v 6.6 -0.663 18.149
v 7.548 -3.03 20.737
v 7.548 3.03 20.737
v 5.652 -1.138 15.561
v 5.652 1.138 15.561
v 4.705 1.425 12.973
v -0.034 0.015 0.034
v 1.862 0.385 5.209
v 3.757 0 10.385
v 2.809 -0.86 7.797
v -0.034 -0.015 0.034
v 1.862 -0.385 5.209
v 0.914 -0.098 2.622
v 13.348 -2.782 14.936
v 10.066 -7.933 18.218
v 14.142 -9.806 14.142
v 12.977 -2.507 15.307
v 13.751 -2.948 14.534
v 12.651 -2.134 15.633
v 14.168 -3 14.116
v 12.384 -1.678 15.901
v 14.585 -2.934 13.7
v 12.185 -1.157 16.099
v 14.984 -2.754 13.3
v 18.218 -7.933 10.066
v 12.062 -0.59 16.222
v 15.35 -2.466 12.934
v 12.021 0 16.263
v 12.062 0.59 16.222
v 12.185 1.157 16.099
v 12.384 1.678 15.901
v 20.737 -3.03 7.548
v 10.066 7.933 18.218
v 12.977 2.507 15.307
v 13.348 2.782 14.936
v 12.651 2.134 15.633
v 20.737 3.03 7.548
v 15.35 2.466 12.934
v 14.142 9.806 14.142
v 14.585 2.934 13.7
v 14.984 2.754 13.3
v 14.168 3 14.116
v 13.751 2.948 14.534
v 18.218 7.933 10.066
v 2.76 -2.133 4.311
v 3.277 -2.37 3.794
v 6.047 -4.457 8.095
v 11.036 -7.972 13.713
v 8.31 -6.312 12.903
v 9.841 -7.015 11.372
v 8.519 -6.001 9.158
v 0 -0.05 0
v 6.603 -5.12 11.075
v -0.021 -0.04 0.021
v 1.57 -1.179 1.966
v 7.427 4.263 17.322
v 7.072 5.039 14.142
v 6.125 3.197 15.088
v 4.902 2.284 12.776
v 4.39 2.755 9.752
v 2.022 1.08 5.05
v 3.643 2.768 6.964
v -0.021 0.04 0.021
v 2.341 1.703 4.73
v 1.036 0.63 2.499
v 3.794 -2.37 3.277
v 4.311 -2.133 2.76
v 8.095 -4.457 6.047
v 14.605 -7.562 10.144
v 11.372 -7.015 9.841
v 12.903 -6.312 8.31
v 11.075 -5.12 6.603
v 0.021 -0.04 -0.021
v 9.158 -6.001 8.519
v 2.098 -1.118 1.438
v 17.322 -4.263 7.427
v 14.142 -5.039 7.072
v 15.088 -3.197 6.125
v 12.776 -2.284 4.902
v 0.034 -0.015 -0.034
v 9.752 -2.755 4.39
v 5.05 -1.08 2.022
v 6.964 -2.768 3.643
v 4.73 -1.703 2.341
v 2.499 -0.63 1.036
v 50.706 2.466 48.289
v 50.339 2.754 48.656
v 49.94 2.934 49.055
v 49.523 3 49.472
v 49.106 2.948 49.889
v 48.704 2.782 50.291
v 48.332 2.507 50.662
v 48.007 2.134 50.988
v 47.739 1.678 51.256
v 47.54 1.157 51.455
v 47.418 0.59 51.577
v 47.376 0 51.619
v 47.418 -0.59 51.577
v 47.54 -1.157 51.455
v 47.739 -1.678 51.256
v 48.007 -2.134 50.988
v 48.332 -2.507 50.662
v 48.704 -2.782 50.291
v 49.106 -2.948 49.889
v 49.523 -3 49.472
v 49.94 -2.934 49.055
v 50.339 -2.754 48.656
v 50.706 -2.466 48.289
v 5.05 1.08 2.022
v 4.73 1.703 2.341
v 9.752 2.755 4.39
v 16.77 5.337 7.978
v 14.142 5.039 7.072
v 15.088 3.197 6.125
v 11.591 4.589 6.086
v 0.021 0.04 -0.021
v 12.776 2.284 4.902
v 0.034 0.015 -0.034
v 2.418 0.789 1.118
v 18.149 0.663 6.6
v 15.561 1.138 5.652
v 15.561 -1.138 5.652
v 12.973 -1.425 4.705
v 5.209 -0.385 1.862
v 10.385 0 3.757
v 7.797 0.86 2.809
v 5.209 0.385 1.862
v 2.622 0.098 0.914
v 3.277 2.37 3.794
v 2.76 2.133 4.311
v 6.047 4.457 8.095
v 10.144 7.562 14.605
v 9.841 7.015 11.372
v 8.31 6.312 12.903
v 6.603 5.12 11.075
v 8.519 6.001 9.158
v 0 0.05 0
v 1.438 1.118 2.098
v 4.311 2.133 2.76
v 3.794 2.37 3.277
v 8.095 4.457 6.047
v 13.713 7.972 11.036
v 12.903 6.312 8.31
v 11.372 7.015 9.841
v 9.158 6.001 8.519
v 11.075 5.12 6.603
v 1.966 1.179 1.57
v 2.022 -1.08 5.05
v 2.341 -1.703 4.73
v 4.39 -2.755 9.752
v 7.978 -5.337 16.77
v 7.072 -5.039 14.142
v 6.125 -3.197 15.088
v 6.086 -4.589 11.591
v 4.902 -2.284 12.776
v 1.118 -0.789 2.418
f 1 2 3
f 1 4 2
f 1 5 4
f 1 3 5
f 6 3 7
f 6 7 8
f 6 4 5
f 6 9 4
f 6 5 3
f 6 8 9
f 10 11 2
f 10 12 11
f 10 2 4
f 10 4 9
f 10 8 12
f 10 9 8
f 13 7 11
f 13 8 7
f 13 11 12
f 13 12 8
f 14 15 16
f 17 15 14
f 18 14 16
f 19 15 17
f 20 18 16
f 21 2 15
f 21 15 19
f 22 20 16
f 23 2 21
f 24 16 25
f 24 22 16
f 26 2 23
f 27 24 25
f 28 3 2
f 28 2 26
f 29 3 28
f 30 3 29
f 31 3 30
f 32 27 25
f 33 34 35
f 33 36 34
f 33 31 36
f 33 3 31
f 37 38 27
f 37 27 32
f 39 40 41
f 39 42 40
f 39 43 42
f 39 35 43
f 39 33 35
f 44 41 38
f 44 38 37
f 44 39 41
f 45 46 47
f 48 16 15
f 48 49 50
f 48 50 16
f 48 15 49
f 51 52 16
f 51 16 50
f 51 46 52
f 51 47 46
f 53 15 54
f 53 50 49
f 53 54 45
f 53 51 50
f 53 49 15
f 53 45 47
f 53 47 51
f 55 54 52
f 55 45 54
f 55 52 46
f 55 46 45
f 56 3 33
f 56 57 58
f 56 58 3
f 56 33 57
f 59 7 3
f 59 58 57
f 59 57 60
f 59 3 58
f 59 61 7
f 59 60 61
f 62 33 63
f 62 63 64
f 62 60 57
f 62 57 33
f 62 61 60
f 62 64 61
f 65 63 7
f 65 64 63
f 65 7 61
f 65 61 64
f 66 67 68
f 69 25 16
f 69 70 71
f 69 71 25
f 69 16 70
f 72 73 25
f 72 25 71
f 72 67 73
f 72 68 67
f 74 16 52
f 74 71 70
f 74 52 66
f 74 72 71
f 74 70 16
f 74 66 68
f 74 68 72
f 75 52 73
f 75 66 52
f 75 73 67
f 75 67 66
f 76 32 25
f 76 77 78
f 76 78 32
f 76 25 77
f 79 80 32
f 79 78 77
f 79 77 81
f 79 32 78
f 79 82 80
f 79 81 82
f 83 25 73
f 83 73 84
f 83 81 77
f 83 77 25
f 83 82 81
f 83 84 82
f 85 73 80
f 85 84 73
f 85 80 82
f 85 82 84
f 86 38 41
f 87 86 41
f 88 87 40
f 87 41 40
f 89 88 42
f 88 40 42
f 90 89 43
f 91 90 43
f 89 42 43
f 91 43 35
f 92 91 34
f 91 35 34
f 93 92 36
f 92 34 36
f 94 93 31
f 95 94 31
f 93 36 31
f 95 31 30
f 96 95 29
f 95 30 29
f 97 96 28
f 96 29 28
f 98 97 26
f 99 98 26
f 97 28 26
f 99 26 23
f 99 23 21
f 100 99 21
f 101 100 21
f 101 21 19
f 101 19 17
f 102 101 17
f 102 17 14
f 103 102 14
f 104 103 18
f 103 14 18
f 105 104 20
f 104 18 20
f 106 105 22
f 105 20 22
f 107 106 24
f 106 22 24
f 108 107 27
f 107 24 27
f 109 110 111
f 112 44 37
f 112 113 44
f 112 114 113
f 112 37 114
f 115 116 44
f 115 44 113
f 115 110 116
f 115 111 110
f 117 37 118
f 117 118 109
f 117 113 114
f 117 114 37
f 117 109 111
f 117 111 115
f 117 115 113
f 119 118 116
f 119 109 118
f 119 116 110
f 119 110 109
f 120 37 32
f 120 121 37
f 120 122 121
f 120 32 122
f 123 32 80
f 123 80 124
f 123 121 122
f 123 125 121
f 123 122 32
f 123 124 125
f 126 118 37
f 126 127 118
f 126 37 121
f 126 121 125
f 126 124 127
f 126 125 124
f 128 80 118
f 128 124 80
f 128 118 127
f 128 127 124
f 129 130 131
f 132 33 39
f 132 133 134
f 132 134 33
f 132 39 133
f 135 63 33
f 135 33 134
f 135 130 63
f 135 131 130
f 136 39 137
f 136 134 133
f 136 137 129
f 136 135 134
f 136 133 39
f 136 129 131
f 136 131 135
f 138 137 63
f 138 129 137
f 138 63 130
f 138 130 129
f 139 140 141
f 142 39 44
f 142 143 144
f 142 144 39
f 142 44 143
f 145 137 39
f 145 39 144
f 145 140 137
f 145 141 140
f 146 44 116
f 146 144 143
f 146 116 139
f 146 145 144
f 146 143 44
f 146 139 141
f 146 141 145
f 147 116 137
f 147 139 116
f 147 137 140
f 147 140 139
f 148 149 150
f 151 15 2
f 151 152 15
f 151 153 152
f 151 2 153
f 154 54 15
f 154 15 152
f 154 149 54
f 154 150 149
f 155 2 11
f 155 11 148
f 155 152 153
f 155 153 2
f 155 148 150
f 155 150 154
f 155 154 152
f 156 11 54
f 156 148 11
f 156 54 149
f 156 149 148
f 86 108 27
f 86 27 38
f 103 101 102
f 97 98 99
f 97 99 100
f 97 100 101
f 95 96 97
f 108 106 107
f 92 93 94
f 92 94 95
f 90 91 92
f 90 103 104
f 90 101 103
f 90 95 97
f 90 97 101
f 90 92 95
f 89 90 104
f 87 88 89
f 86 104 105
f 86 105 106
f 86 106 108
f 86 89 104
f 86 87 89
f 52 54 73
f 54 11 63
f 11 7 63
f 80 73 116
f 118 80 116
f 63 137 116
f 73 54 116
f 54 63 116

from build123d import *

# Parameters (mm, degrees)
F7_DEPTH = 50
F8_W     = 5
F8_H     = 5
F9_DEPTH = 12.5


with BuildPart() as f5:
    # F2 (on face) → F5 section 0
    with BuildSketch(Plane(origin=(14.1421356237, 0, 14.1421356237), x_dir=(0.7071067812, 0, -0.7071067812), z_dir=(-0.7071067812, 0, -0.7071067812))):
        Polygon((-9.3261531631, 3.0302508528), (-9.3261531631, -3.0302508528), (-5.7638796391, -7.933299727), (0, -9.8060977485), (5.7638796391, -7.933299727), (9.3261531631, -3.0302508528), (9.3261531631, 3.0302508528), (5.7638796391, 7.933299727), (0, 9.8060977485), (-5.7638796391, 7.933299727), align=None)
    # F4 (on face) → F5 section 1
    with BuildSketch(Plane(origin=(0, 0, 0), x_dir=(0.7071067812, 0, -0.7071067812), z_dir=(-0.7071067812, 0, -0.7071067812))):
        Polygon((-0.0475528258, 0.0154508497), (-0.0475528258, -0.0154508497), (-0.0293892626, -0.0404508497), (0, -0.05), (0.0293892626, -0.0404508497), (0.0475528258, -0.0154508497), (0.0475528258, 0.0154508497), (0.0293892626, 0.0404508497), (0, 0.05), (-0.0293892626, 0.0404508497), align=None)
    loft()

    # F6 (on face) → F7 (join)
    with BuildSketch(Plane(origin=(14.1421356237, 0, 14.1421356237), x_dir=(0.7071067812, 0, -0.7071067812), z_dir=(0.7071067812, 0, 0.7071067812))):
        with BuildLine():
            Line((1.7084597584, -2.4660018763), (1.7084597584, 2.4660018763))
            ThreePointArc((1.7084597584, 2.4660018763), (-3, 0), (1.7084597584, -2.4660018763))
        make_face()
    extrude(amount=F7_DEPTH)

    # F8 (on Front) → F9 (cut, symmetric)
    with BuildSketch(Plane.XZ):
        with Locations((11.3405170292, 22.6421356237)):
            Rectangle(F8_W, F8_H)
    extrude(amount=F9_DEPTH, both=True, mode=Mode.SUBTRACT)


solid = f5.part
